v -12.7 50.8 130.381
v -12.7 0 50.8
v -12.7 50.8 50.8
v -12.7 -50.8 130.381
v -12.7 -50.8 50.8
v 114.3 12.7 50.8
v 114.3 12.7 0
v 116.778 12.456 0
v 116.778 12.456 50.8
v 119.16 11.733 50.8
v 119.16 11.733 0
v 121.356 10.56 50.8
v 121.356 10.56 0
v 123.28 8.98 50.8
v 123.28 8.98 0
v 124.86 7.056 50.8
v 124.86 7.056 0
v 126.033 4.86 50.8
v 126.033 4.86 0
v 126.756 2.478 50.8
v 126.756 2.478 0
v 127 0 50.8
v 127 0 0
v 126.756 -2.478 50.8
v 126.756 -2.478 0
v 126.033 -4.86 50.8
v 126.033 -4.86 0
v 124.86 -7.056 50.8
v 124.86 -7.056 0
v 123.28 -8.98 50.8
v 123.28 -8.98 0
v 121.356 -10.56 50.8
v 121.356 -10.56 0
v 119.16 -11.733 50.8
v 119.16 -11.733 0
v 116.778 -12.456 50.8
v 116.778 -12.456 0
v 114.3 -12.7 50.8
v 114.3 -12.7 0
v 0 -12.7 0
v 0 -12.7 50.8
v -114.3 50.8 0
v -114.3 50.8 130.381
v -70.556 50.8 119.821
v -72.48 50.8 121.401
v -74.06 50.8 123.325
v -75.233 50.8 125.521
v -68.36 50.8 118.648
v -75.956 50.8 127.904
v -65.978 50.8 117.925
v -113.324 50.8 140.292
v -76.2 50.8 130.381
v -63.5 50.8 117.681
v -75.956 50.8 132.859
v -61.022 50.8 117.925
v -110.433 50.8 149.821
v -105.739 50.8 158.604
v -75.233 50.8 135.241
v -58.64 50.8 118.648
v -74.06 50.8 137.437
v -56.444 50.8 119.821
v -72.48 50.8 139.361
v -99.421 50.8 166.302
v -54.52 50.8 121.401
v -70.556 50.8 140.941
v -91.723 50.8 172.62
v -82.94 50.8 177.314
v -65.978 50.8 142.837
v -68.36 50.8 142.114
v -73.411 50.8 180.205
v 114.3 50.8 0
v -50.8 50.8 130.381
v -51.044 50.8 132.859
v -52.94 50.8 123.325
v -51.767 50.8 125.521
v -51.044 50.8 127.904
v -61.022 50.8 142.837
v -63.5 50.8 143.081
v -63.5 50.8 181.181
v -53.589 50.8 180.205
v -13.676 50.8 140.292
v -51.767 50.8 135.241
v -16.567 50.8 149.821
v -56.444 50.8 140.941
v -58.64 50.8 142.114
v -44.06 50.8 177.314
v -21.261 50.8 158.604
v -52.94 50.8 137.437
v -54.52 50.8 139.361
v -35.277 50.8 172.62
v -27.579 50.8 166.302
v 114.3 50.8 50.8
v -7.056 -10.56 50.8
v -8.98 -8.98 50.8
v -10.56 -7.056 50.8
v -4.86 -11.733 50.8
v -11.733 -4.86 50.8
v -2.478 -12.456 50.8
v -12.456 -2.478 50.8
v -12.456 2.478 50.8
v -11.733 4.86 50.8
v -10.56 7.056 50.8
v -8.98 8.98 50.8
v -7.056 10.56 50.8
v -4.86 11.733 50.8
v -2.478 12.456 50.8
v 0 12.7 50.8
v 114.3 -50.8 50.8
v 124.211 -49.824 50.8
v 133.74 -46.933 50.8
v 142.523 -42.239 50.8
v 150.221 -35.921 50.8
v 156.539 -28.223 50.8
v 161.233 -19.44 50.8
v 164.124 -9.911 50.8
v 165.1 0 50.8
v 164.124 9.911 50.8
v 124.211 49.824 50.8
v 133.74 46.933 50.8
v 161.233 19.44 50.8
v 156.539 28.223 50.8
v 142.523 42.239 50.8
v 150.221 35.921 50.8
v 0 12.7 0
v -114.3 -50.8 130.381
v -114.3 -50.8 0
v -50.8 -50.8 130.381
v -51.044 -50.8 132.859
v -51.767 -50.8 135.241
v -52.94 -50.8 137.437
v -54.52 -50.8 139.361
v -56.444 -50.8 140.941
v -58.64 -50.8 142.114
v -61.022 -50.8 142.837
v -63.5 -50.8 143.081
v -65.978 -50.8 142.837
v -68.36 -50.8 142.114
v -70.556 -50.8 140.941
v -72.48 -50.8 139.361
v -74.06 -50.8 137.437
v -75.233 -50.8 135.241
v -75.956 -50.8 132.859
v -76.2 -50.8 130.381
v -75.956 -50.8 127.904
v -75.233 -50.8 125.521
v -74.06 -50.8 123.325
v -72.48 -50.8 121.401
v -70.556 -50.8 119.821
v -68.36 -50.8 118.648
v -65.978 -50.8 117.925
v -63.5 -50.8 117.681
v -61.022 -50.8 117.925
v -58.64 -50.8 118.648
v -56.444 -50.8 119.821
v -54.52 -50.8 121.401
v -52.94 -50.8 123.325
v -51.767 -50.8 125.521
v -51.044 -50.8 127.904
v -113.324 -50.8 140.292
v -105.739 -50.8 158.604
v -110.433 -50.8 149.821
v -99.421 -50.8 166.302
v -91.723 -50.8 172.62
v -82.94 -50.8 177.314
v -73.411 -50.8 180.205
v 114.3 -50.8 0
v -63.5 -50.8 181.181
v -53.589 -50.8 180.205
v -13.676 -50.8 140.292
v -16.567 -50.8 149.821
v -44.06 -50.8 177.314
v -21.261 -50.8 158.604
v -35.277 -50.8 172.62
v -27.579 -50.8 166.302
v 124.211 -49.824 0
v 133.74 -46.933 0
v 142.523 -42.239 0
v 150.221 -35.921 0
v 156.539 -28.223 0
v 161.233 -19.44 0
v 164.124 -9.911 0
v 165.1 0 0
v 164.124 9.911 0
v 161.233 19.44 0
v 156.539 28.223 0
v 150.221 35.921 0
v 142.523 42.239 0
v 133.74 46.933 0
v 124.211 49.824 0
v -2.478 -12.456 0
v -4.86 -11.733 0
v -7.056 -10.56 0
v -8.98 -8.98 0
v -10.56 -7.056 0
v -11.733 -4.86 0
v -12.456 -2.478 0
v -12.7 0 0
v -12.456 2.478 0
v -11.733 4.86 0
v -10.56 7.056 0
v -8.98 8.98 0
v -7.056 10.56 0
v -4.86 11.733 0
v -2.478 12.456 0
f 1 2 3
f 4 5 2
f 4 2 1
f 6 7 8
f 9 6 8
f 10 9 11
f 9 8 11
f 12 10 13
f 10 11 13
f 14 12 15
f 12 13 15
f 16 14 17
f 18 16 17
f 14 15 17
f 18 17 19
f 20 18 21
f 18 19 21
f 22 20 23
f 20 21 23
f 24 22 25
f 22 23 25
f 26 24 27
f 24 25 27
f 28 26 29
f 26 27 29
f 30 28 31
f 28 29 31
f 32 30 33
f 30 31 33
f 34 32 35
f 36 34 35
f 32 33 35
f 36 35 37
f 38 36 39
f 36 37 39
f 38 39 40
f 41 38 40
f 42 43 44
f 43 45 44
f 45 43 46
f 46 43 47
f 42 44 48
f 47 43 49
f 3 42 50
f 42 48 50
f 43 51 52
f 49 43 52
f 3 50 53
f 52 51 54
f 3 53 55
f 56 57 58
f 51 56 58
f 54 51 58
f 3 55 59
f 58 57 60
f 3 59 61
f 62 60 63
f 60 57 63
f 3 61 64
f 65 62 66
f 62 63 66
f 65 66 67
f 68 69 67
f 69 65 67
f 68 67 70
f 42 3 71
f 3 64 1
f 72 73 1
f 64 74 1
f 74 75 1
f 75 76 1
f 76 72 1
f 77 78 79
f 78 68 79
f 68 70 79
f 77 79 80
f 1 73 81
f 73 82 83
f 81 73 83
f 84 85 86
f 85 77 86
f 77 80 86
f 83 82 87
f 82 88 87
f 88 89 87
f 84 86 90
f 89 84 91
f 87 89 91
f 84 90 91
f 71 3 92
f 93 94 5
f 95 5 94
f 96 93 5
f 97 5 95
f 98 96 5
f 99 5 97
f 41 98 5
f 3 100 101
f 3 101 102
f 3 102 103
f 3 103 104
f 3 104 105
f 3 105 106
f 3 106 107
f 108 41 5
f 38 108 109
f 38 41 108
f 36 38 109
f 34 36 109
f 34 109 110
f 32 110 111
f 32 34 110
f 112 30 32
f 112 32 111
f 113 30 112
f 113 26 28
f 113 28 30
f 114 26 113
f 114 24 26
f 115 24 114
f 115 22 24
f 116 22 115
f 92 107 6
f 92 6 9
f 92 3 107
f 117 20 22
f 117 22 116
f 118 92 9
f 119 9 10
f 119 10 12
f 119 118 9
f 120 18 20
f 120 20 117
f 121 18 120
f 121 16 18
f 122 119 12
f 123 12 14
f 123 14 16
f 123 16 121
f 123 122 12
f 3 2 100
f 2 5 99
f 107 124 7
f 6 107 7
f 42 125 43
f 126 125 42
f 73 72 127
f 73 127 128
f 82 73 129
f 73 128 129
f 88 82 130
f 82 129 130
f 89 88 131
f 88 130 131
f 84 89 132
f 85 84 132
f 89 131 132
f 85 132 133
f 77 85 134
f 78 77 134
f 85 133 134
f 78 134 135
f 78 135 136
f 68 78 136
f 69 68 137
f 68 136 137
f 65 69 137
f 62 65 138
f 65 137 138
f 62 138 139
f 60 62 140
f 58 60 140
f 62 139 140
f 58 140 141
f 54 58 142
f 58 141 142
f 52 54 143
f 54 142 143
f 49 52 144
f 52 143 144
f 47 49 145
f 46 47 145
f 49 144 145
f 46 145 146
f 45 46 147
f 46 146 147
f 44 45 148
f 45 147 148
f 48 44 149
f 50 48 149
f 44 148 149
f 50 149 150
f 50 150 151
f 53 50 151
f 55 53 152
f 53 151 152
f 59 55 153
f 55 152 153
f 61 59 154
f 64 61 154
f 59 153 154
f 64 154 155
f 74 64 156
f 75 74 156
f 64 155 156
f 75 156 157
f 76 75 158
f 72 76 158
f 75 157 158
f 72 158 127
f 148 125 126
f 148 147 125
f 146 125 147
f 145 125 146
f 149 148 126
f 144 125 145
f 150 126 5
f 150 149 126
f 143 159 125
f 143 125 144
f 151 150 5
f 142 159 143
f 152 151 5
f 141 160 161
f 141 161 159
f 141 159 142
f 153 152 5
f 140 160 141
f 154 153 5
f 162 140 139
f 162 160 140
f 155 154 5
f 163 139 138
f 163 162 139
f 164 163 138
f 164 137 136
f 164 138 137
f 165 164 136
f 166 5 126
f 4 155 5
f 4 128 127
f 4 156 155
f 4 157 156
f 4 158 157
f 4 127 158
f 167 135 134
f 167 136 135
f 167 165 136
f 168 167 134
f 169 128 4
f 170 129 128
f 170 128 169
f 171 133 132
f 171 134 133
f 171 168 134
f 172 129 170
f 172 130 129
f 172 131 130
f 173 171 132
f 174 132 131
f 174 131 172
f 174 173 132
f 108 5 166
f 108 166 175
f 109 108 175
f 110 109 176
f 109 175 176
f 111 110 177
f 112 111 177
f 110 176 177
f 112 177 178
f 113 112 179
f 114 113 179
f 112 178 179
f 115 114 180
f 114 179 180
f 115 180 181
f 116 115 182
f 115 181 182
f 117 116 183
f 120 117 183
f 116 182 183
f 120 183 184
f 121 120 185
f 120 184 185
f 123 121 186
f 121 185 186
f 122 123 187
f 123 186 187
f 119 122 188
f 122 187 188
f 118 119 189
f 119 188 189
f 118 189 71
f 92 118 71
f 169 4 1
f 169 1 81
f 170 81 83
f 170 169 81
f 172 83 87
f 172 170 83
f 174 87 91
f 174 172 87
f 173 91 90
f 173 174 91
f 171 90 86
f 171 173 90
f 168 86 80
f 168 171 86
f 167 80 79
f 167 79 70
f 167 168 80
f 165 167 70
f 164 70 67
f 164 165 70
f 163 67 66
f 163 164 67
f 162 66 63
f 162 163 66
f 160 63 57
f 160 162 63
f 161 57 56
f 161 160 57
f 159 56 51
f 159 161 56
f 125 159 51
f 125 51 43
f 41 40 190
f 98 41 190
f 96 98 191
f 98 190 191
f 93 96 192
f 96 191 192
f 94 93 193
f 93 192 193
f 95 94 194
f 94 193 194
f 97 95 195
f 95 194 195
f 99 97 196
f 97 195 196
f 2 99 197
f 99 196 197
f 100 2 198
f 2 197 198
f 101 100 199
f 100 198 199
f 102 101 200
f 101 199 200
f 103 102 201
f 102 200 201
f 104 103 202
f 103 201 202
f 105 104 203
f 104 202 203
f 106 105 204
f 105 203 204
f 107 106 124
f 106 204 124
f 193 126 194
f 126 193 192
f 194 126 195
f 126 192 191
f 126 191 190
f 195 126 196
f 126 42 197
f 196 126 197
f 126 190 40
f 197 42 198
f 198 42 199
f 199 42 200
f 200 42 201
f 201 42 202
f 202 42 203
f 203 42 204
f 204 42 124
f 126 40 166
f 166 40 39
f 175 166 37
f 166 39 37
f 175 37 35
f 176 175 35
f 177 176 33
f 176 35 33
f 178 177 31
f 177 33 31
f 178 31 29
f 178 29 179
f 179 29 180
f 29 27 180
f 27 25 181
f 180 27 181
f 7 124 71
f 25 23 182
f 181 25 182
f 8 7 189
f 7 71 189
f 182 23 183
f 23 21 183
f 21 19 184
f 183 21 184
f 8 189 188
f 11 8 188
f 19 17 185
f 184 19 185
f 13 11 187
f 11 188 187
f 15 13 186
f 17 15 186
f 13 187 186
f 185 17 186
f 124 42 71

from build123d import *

# Parameters (mm, degrees)
F1_DEPTH = 50.8
F2_R     = 12.7
F3_DEPTH = 101.6


with BuildPart() as f1:
    # F0 (on Top) → F1 (new body)
    with BuildSketch(Plane.XY):
        with BuildLine():
            ThreePointArc((114.3, -50.8), (165.1, 0), (114.3, 50.8))
            Line((114.3, 50.8), (-114.3, 50.8))
            Line((-114.3, 50.8), (-114.3, -50.8))
            Line((-114.3, -50.8), (114.3, -50.8))
        make_face()
        with BuildLine():
            Line((114.3, -12.7), (0, -12.7))
            ThreePointArc((0, -12.7), (-12.7, 0), (0, 12.7))
            Line((0, 12.7), (114.3, 12.7))
            ThreePointArc((114.3, 12.7), (127, 0), (114.3, -12.7))
        make_face(mode=Mode.SUBTRACT)
    extrude(amount=F1_DEPTH)

    # F2 (on face) → F3 (join)
    with BuildSketch(Plane.XZ.offset(50.8)):
        with BuildLine():
            Line((-114.3, 50.8), (-12.7, 50.8))
            Line((-12.7, 50.8), (-12.7, 130.381152))
            ThreePointArc((-12.7, 130.381152), (-63.5, 181.181152), (-114.3, 130.381152))
            Line((-114.3, 130.381152), (-114.3, 50.8))
        make_face()
        with Locations((-63.5, 130.381152)):
            Circle(F2_R, mode=Mode.SUBTRACT)
    extrude(amount=-F3_DEPTH)


solid = f1.part
